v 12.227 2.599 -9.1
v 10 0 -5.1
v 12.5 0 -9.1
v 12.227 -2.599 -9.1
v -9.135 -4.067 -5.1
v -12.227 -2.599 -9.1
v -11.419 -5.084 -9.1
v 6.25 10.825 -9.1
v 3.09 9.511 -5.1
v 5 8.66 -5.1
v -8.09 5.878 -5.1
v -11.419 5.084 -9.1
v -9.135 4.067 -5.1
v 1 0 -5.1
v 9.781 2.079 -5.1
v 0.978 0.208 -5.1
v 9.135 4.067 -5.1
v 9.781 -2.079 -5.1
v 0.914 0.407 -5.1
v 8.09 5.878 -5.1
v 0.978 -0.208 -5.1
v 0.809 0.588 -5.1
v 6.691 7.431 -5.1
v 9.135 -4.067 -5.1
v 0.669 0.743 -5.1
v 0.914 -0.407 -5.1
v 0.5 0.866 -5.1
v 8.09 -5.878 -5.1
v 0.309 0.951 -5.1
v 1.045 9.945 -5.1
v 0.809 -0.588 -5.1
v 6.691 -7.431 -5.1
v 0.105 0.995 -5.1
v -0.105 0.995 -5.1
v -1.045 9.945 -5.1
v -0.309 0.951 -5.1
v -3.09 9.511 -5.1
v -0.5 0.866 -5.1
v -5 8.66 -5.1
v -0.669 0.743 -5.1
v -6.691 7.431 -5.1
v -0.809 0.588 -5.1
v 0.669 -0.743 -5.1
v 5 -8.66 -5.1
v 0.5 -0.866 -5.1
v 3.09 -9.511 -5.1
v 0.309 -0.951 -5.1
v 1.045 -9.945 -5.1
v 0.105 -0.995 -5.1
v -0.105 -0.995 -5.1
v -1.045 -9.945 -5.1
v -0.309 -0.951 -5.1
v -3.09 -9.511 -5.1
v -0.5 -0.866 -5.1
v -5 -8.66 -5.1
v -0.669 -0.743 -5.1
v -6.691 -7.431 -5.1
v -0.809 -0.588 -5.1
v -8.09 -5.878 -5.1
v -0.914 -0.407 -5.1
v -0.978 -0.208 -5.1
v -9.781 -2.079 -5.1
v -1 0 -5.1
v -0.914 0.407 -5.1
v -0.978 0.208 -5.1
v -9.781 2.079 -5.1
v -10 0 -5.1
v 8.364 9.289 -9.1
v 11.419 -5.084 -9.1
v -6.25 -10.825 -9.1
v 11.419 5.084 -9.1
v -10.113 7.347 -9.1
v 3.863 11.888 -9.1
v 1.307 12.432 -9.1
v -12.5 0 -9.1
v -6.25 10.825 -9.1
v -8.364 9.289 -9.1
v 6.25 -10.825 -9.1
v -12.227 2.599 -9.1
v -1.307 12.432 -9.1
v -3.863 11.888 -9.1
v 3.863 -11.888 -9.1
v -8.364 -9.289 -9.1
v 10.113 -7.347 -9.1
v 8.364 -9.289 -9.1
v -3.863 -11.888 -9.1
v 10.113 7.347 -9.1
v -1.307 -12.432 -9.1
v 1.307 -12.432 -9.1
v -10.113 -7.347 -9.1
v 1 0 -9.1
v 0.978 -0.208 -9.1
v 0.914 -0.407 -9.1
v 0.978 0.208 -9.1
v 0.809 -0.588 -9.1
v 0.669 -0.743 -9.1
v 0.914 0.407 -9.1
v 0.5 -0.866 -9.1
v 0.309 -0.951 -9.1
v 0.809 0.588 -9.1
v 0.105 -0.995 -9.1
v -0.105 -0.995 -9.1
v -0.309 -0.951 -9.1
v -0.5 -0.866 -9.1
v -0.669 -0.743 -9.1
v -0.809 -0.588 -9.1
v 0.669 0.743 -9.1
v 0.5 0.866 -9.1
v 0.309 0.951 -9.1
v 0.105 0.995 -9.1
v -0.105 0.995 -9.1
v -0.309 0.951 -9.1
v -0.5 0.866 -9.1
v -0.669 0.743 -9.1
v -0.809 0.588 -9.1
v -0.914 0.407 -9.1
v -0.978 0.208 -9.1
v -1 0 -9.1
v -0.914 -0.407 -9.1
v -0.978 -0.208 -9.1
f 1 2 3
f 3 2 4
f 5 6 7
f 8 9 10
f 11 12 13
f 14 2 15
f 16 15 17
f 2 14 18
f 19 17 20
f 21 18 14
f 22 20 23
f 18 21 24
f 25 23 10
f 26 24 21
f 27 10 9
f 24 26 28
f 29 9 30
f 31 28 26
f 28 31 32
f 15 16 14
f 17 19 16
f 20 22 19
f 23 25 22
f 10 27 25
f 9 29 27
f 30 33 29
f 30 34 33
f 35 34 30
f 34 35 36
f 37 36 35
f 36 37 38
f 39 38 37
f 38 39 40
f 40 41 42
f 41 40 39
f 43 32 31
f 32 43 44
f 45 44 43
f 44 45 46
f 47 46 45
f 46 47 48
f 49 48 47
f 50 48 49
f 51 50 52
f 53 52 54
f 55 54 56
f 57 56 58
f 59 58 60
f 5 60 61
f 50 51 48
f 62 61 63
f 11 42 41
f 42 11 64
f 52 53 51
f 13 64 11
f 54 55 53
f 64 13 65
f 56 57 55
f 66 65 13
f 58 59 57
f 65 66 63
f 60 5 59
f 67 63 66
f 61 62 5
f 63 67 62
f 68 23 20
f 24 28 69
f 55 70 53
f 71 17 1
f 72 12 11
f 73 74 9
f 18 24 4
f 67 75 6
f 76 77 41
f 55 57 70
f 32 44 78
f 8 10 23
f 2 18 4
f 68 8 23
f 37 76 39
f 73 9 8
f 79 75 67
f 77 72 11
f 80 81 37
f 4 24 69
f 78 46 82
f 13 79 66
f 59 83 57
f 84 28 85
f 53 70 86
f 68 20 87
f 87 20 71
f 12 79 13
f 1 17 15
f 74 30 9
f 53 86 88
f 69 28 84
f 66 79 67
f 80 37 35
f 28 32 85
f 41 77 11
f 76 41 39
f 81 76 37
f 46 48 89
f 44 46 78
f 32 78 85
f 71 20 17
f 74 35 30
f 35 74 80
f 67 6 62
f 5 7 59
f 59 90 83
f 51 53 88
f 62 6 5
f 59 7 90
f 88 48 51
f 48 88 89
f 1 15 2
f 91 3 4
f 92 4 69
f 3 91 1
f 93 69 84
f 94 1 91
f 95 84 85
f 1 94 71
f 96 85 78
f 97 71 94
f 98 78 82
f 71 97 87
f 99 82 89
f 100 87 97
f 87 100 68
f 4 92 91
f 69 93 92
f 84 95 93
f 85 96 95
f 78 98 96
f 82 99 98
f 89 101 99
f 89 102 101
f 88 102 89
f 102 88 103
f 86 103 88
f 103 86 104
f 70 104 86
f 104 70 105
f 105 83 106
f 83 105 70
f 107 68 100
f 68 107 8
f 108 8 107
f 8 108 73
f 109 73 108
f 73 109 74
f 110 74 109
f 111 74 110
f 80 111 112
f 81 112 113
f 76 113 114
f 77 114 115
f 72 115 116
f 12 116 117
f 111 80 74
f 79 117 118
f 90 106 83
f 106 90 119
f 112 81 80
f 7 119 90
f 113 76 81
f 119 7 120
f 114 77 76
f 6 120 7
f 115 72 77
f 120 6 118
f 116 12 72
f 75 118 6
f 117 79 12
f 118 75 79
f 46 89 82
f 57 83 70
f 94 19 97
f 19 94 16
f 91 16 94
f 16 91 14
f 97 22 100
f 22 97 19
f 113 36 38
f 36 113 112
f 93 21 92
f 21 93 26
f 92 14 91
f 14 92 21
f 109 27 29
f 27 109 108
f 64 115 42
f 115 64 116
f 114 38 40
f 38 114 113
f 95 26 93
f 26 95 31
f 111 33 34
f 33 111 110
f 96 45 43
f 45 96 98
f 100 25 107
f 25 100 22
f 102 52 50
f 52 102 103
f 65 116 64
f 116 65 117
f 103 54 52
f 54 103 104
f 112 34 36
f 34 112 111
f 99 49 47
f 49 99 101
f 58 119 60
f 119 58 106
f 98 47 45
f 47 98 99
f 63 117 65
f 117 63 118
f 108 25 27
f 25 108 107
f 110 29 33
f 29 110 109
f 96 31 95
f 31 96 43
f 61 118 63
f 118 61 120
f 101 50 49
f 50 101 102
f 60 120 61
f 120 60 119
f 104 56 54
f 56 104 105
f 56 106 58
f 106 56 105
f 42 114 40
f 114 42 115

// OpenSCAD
difference() { //bur fixation
    translate ([0,0,-7.1]) cylinder (d1=25, d2=20, h=4, $fs=0.1, center=true);
    translate ([0,0,-4.1]) cylinder (d=2, h=15, $fs=0.1, center=true);
}
